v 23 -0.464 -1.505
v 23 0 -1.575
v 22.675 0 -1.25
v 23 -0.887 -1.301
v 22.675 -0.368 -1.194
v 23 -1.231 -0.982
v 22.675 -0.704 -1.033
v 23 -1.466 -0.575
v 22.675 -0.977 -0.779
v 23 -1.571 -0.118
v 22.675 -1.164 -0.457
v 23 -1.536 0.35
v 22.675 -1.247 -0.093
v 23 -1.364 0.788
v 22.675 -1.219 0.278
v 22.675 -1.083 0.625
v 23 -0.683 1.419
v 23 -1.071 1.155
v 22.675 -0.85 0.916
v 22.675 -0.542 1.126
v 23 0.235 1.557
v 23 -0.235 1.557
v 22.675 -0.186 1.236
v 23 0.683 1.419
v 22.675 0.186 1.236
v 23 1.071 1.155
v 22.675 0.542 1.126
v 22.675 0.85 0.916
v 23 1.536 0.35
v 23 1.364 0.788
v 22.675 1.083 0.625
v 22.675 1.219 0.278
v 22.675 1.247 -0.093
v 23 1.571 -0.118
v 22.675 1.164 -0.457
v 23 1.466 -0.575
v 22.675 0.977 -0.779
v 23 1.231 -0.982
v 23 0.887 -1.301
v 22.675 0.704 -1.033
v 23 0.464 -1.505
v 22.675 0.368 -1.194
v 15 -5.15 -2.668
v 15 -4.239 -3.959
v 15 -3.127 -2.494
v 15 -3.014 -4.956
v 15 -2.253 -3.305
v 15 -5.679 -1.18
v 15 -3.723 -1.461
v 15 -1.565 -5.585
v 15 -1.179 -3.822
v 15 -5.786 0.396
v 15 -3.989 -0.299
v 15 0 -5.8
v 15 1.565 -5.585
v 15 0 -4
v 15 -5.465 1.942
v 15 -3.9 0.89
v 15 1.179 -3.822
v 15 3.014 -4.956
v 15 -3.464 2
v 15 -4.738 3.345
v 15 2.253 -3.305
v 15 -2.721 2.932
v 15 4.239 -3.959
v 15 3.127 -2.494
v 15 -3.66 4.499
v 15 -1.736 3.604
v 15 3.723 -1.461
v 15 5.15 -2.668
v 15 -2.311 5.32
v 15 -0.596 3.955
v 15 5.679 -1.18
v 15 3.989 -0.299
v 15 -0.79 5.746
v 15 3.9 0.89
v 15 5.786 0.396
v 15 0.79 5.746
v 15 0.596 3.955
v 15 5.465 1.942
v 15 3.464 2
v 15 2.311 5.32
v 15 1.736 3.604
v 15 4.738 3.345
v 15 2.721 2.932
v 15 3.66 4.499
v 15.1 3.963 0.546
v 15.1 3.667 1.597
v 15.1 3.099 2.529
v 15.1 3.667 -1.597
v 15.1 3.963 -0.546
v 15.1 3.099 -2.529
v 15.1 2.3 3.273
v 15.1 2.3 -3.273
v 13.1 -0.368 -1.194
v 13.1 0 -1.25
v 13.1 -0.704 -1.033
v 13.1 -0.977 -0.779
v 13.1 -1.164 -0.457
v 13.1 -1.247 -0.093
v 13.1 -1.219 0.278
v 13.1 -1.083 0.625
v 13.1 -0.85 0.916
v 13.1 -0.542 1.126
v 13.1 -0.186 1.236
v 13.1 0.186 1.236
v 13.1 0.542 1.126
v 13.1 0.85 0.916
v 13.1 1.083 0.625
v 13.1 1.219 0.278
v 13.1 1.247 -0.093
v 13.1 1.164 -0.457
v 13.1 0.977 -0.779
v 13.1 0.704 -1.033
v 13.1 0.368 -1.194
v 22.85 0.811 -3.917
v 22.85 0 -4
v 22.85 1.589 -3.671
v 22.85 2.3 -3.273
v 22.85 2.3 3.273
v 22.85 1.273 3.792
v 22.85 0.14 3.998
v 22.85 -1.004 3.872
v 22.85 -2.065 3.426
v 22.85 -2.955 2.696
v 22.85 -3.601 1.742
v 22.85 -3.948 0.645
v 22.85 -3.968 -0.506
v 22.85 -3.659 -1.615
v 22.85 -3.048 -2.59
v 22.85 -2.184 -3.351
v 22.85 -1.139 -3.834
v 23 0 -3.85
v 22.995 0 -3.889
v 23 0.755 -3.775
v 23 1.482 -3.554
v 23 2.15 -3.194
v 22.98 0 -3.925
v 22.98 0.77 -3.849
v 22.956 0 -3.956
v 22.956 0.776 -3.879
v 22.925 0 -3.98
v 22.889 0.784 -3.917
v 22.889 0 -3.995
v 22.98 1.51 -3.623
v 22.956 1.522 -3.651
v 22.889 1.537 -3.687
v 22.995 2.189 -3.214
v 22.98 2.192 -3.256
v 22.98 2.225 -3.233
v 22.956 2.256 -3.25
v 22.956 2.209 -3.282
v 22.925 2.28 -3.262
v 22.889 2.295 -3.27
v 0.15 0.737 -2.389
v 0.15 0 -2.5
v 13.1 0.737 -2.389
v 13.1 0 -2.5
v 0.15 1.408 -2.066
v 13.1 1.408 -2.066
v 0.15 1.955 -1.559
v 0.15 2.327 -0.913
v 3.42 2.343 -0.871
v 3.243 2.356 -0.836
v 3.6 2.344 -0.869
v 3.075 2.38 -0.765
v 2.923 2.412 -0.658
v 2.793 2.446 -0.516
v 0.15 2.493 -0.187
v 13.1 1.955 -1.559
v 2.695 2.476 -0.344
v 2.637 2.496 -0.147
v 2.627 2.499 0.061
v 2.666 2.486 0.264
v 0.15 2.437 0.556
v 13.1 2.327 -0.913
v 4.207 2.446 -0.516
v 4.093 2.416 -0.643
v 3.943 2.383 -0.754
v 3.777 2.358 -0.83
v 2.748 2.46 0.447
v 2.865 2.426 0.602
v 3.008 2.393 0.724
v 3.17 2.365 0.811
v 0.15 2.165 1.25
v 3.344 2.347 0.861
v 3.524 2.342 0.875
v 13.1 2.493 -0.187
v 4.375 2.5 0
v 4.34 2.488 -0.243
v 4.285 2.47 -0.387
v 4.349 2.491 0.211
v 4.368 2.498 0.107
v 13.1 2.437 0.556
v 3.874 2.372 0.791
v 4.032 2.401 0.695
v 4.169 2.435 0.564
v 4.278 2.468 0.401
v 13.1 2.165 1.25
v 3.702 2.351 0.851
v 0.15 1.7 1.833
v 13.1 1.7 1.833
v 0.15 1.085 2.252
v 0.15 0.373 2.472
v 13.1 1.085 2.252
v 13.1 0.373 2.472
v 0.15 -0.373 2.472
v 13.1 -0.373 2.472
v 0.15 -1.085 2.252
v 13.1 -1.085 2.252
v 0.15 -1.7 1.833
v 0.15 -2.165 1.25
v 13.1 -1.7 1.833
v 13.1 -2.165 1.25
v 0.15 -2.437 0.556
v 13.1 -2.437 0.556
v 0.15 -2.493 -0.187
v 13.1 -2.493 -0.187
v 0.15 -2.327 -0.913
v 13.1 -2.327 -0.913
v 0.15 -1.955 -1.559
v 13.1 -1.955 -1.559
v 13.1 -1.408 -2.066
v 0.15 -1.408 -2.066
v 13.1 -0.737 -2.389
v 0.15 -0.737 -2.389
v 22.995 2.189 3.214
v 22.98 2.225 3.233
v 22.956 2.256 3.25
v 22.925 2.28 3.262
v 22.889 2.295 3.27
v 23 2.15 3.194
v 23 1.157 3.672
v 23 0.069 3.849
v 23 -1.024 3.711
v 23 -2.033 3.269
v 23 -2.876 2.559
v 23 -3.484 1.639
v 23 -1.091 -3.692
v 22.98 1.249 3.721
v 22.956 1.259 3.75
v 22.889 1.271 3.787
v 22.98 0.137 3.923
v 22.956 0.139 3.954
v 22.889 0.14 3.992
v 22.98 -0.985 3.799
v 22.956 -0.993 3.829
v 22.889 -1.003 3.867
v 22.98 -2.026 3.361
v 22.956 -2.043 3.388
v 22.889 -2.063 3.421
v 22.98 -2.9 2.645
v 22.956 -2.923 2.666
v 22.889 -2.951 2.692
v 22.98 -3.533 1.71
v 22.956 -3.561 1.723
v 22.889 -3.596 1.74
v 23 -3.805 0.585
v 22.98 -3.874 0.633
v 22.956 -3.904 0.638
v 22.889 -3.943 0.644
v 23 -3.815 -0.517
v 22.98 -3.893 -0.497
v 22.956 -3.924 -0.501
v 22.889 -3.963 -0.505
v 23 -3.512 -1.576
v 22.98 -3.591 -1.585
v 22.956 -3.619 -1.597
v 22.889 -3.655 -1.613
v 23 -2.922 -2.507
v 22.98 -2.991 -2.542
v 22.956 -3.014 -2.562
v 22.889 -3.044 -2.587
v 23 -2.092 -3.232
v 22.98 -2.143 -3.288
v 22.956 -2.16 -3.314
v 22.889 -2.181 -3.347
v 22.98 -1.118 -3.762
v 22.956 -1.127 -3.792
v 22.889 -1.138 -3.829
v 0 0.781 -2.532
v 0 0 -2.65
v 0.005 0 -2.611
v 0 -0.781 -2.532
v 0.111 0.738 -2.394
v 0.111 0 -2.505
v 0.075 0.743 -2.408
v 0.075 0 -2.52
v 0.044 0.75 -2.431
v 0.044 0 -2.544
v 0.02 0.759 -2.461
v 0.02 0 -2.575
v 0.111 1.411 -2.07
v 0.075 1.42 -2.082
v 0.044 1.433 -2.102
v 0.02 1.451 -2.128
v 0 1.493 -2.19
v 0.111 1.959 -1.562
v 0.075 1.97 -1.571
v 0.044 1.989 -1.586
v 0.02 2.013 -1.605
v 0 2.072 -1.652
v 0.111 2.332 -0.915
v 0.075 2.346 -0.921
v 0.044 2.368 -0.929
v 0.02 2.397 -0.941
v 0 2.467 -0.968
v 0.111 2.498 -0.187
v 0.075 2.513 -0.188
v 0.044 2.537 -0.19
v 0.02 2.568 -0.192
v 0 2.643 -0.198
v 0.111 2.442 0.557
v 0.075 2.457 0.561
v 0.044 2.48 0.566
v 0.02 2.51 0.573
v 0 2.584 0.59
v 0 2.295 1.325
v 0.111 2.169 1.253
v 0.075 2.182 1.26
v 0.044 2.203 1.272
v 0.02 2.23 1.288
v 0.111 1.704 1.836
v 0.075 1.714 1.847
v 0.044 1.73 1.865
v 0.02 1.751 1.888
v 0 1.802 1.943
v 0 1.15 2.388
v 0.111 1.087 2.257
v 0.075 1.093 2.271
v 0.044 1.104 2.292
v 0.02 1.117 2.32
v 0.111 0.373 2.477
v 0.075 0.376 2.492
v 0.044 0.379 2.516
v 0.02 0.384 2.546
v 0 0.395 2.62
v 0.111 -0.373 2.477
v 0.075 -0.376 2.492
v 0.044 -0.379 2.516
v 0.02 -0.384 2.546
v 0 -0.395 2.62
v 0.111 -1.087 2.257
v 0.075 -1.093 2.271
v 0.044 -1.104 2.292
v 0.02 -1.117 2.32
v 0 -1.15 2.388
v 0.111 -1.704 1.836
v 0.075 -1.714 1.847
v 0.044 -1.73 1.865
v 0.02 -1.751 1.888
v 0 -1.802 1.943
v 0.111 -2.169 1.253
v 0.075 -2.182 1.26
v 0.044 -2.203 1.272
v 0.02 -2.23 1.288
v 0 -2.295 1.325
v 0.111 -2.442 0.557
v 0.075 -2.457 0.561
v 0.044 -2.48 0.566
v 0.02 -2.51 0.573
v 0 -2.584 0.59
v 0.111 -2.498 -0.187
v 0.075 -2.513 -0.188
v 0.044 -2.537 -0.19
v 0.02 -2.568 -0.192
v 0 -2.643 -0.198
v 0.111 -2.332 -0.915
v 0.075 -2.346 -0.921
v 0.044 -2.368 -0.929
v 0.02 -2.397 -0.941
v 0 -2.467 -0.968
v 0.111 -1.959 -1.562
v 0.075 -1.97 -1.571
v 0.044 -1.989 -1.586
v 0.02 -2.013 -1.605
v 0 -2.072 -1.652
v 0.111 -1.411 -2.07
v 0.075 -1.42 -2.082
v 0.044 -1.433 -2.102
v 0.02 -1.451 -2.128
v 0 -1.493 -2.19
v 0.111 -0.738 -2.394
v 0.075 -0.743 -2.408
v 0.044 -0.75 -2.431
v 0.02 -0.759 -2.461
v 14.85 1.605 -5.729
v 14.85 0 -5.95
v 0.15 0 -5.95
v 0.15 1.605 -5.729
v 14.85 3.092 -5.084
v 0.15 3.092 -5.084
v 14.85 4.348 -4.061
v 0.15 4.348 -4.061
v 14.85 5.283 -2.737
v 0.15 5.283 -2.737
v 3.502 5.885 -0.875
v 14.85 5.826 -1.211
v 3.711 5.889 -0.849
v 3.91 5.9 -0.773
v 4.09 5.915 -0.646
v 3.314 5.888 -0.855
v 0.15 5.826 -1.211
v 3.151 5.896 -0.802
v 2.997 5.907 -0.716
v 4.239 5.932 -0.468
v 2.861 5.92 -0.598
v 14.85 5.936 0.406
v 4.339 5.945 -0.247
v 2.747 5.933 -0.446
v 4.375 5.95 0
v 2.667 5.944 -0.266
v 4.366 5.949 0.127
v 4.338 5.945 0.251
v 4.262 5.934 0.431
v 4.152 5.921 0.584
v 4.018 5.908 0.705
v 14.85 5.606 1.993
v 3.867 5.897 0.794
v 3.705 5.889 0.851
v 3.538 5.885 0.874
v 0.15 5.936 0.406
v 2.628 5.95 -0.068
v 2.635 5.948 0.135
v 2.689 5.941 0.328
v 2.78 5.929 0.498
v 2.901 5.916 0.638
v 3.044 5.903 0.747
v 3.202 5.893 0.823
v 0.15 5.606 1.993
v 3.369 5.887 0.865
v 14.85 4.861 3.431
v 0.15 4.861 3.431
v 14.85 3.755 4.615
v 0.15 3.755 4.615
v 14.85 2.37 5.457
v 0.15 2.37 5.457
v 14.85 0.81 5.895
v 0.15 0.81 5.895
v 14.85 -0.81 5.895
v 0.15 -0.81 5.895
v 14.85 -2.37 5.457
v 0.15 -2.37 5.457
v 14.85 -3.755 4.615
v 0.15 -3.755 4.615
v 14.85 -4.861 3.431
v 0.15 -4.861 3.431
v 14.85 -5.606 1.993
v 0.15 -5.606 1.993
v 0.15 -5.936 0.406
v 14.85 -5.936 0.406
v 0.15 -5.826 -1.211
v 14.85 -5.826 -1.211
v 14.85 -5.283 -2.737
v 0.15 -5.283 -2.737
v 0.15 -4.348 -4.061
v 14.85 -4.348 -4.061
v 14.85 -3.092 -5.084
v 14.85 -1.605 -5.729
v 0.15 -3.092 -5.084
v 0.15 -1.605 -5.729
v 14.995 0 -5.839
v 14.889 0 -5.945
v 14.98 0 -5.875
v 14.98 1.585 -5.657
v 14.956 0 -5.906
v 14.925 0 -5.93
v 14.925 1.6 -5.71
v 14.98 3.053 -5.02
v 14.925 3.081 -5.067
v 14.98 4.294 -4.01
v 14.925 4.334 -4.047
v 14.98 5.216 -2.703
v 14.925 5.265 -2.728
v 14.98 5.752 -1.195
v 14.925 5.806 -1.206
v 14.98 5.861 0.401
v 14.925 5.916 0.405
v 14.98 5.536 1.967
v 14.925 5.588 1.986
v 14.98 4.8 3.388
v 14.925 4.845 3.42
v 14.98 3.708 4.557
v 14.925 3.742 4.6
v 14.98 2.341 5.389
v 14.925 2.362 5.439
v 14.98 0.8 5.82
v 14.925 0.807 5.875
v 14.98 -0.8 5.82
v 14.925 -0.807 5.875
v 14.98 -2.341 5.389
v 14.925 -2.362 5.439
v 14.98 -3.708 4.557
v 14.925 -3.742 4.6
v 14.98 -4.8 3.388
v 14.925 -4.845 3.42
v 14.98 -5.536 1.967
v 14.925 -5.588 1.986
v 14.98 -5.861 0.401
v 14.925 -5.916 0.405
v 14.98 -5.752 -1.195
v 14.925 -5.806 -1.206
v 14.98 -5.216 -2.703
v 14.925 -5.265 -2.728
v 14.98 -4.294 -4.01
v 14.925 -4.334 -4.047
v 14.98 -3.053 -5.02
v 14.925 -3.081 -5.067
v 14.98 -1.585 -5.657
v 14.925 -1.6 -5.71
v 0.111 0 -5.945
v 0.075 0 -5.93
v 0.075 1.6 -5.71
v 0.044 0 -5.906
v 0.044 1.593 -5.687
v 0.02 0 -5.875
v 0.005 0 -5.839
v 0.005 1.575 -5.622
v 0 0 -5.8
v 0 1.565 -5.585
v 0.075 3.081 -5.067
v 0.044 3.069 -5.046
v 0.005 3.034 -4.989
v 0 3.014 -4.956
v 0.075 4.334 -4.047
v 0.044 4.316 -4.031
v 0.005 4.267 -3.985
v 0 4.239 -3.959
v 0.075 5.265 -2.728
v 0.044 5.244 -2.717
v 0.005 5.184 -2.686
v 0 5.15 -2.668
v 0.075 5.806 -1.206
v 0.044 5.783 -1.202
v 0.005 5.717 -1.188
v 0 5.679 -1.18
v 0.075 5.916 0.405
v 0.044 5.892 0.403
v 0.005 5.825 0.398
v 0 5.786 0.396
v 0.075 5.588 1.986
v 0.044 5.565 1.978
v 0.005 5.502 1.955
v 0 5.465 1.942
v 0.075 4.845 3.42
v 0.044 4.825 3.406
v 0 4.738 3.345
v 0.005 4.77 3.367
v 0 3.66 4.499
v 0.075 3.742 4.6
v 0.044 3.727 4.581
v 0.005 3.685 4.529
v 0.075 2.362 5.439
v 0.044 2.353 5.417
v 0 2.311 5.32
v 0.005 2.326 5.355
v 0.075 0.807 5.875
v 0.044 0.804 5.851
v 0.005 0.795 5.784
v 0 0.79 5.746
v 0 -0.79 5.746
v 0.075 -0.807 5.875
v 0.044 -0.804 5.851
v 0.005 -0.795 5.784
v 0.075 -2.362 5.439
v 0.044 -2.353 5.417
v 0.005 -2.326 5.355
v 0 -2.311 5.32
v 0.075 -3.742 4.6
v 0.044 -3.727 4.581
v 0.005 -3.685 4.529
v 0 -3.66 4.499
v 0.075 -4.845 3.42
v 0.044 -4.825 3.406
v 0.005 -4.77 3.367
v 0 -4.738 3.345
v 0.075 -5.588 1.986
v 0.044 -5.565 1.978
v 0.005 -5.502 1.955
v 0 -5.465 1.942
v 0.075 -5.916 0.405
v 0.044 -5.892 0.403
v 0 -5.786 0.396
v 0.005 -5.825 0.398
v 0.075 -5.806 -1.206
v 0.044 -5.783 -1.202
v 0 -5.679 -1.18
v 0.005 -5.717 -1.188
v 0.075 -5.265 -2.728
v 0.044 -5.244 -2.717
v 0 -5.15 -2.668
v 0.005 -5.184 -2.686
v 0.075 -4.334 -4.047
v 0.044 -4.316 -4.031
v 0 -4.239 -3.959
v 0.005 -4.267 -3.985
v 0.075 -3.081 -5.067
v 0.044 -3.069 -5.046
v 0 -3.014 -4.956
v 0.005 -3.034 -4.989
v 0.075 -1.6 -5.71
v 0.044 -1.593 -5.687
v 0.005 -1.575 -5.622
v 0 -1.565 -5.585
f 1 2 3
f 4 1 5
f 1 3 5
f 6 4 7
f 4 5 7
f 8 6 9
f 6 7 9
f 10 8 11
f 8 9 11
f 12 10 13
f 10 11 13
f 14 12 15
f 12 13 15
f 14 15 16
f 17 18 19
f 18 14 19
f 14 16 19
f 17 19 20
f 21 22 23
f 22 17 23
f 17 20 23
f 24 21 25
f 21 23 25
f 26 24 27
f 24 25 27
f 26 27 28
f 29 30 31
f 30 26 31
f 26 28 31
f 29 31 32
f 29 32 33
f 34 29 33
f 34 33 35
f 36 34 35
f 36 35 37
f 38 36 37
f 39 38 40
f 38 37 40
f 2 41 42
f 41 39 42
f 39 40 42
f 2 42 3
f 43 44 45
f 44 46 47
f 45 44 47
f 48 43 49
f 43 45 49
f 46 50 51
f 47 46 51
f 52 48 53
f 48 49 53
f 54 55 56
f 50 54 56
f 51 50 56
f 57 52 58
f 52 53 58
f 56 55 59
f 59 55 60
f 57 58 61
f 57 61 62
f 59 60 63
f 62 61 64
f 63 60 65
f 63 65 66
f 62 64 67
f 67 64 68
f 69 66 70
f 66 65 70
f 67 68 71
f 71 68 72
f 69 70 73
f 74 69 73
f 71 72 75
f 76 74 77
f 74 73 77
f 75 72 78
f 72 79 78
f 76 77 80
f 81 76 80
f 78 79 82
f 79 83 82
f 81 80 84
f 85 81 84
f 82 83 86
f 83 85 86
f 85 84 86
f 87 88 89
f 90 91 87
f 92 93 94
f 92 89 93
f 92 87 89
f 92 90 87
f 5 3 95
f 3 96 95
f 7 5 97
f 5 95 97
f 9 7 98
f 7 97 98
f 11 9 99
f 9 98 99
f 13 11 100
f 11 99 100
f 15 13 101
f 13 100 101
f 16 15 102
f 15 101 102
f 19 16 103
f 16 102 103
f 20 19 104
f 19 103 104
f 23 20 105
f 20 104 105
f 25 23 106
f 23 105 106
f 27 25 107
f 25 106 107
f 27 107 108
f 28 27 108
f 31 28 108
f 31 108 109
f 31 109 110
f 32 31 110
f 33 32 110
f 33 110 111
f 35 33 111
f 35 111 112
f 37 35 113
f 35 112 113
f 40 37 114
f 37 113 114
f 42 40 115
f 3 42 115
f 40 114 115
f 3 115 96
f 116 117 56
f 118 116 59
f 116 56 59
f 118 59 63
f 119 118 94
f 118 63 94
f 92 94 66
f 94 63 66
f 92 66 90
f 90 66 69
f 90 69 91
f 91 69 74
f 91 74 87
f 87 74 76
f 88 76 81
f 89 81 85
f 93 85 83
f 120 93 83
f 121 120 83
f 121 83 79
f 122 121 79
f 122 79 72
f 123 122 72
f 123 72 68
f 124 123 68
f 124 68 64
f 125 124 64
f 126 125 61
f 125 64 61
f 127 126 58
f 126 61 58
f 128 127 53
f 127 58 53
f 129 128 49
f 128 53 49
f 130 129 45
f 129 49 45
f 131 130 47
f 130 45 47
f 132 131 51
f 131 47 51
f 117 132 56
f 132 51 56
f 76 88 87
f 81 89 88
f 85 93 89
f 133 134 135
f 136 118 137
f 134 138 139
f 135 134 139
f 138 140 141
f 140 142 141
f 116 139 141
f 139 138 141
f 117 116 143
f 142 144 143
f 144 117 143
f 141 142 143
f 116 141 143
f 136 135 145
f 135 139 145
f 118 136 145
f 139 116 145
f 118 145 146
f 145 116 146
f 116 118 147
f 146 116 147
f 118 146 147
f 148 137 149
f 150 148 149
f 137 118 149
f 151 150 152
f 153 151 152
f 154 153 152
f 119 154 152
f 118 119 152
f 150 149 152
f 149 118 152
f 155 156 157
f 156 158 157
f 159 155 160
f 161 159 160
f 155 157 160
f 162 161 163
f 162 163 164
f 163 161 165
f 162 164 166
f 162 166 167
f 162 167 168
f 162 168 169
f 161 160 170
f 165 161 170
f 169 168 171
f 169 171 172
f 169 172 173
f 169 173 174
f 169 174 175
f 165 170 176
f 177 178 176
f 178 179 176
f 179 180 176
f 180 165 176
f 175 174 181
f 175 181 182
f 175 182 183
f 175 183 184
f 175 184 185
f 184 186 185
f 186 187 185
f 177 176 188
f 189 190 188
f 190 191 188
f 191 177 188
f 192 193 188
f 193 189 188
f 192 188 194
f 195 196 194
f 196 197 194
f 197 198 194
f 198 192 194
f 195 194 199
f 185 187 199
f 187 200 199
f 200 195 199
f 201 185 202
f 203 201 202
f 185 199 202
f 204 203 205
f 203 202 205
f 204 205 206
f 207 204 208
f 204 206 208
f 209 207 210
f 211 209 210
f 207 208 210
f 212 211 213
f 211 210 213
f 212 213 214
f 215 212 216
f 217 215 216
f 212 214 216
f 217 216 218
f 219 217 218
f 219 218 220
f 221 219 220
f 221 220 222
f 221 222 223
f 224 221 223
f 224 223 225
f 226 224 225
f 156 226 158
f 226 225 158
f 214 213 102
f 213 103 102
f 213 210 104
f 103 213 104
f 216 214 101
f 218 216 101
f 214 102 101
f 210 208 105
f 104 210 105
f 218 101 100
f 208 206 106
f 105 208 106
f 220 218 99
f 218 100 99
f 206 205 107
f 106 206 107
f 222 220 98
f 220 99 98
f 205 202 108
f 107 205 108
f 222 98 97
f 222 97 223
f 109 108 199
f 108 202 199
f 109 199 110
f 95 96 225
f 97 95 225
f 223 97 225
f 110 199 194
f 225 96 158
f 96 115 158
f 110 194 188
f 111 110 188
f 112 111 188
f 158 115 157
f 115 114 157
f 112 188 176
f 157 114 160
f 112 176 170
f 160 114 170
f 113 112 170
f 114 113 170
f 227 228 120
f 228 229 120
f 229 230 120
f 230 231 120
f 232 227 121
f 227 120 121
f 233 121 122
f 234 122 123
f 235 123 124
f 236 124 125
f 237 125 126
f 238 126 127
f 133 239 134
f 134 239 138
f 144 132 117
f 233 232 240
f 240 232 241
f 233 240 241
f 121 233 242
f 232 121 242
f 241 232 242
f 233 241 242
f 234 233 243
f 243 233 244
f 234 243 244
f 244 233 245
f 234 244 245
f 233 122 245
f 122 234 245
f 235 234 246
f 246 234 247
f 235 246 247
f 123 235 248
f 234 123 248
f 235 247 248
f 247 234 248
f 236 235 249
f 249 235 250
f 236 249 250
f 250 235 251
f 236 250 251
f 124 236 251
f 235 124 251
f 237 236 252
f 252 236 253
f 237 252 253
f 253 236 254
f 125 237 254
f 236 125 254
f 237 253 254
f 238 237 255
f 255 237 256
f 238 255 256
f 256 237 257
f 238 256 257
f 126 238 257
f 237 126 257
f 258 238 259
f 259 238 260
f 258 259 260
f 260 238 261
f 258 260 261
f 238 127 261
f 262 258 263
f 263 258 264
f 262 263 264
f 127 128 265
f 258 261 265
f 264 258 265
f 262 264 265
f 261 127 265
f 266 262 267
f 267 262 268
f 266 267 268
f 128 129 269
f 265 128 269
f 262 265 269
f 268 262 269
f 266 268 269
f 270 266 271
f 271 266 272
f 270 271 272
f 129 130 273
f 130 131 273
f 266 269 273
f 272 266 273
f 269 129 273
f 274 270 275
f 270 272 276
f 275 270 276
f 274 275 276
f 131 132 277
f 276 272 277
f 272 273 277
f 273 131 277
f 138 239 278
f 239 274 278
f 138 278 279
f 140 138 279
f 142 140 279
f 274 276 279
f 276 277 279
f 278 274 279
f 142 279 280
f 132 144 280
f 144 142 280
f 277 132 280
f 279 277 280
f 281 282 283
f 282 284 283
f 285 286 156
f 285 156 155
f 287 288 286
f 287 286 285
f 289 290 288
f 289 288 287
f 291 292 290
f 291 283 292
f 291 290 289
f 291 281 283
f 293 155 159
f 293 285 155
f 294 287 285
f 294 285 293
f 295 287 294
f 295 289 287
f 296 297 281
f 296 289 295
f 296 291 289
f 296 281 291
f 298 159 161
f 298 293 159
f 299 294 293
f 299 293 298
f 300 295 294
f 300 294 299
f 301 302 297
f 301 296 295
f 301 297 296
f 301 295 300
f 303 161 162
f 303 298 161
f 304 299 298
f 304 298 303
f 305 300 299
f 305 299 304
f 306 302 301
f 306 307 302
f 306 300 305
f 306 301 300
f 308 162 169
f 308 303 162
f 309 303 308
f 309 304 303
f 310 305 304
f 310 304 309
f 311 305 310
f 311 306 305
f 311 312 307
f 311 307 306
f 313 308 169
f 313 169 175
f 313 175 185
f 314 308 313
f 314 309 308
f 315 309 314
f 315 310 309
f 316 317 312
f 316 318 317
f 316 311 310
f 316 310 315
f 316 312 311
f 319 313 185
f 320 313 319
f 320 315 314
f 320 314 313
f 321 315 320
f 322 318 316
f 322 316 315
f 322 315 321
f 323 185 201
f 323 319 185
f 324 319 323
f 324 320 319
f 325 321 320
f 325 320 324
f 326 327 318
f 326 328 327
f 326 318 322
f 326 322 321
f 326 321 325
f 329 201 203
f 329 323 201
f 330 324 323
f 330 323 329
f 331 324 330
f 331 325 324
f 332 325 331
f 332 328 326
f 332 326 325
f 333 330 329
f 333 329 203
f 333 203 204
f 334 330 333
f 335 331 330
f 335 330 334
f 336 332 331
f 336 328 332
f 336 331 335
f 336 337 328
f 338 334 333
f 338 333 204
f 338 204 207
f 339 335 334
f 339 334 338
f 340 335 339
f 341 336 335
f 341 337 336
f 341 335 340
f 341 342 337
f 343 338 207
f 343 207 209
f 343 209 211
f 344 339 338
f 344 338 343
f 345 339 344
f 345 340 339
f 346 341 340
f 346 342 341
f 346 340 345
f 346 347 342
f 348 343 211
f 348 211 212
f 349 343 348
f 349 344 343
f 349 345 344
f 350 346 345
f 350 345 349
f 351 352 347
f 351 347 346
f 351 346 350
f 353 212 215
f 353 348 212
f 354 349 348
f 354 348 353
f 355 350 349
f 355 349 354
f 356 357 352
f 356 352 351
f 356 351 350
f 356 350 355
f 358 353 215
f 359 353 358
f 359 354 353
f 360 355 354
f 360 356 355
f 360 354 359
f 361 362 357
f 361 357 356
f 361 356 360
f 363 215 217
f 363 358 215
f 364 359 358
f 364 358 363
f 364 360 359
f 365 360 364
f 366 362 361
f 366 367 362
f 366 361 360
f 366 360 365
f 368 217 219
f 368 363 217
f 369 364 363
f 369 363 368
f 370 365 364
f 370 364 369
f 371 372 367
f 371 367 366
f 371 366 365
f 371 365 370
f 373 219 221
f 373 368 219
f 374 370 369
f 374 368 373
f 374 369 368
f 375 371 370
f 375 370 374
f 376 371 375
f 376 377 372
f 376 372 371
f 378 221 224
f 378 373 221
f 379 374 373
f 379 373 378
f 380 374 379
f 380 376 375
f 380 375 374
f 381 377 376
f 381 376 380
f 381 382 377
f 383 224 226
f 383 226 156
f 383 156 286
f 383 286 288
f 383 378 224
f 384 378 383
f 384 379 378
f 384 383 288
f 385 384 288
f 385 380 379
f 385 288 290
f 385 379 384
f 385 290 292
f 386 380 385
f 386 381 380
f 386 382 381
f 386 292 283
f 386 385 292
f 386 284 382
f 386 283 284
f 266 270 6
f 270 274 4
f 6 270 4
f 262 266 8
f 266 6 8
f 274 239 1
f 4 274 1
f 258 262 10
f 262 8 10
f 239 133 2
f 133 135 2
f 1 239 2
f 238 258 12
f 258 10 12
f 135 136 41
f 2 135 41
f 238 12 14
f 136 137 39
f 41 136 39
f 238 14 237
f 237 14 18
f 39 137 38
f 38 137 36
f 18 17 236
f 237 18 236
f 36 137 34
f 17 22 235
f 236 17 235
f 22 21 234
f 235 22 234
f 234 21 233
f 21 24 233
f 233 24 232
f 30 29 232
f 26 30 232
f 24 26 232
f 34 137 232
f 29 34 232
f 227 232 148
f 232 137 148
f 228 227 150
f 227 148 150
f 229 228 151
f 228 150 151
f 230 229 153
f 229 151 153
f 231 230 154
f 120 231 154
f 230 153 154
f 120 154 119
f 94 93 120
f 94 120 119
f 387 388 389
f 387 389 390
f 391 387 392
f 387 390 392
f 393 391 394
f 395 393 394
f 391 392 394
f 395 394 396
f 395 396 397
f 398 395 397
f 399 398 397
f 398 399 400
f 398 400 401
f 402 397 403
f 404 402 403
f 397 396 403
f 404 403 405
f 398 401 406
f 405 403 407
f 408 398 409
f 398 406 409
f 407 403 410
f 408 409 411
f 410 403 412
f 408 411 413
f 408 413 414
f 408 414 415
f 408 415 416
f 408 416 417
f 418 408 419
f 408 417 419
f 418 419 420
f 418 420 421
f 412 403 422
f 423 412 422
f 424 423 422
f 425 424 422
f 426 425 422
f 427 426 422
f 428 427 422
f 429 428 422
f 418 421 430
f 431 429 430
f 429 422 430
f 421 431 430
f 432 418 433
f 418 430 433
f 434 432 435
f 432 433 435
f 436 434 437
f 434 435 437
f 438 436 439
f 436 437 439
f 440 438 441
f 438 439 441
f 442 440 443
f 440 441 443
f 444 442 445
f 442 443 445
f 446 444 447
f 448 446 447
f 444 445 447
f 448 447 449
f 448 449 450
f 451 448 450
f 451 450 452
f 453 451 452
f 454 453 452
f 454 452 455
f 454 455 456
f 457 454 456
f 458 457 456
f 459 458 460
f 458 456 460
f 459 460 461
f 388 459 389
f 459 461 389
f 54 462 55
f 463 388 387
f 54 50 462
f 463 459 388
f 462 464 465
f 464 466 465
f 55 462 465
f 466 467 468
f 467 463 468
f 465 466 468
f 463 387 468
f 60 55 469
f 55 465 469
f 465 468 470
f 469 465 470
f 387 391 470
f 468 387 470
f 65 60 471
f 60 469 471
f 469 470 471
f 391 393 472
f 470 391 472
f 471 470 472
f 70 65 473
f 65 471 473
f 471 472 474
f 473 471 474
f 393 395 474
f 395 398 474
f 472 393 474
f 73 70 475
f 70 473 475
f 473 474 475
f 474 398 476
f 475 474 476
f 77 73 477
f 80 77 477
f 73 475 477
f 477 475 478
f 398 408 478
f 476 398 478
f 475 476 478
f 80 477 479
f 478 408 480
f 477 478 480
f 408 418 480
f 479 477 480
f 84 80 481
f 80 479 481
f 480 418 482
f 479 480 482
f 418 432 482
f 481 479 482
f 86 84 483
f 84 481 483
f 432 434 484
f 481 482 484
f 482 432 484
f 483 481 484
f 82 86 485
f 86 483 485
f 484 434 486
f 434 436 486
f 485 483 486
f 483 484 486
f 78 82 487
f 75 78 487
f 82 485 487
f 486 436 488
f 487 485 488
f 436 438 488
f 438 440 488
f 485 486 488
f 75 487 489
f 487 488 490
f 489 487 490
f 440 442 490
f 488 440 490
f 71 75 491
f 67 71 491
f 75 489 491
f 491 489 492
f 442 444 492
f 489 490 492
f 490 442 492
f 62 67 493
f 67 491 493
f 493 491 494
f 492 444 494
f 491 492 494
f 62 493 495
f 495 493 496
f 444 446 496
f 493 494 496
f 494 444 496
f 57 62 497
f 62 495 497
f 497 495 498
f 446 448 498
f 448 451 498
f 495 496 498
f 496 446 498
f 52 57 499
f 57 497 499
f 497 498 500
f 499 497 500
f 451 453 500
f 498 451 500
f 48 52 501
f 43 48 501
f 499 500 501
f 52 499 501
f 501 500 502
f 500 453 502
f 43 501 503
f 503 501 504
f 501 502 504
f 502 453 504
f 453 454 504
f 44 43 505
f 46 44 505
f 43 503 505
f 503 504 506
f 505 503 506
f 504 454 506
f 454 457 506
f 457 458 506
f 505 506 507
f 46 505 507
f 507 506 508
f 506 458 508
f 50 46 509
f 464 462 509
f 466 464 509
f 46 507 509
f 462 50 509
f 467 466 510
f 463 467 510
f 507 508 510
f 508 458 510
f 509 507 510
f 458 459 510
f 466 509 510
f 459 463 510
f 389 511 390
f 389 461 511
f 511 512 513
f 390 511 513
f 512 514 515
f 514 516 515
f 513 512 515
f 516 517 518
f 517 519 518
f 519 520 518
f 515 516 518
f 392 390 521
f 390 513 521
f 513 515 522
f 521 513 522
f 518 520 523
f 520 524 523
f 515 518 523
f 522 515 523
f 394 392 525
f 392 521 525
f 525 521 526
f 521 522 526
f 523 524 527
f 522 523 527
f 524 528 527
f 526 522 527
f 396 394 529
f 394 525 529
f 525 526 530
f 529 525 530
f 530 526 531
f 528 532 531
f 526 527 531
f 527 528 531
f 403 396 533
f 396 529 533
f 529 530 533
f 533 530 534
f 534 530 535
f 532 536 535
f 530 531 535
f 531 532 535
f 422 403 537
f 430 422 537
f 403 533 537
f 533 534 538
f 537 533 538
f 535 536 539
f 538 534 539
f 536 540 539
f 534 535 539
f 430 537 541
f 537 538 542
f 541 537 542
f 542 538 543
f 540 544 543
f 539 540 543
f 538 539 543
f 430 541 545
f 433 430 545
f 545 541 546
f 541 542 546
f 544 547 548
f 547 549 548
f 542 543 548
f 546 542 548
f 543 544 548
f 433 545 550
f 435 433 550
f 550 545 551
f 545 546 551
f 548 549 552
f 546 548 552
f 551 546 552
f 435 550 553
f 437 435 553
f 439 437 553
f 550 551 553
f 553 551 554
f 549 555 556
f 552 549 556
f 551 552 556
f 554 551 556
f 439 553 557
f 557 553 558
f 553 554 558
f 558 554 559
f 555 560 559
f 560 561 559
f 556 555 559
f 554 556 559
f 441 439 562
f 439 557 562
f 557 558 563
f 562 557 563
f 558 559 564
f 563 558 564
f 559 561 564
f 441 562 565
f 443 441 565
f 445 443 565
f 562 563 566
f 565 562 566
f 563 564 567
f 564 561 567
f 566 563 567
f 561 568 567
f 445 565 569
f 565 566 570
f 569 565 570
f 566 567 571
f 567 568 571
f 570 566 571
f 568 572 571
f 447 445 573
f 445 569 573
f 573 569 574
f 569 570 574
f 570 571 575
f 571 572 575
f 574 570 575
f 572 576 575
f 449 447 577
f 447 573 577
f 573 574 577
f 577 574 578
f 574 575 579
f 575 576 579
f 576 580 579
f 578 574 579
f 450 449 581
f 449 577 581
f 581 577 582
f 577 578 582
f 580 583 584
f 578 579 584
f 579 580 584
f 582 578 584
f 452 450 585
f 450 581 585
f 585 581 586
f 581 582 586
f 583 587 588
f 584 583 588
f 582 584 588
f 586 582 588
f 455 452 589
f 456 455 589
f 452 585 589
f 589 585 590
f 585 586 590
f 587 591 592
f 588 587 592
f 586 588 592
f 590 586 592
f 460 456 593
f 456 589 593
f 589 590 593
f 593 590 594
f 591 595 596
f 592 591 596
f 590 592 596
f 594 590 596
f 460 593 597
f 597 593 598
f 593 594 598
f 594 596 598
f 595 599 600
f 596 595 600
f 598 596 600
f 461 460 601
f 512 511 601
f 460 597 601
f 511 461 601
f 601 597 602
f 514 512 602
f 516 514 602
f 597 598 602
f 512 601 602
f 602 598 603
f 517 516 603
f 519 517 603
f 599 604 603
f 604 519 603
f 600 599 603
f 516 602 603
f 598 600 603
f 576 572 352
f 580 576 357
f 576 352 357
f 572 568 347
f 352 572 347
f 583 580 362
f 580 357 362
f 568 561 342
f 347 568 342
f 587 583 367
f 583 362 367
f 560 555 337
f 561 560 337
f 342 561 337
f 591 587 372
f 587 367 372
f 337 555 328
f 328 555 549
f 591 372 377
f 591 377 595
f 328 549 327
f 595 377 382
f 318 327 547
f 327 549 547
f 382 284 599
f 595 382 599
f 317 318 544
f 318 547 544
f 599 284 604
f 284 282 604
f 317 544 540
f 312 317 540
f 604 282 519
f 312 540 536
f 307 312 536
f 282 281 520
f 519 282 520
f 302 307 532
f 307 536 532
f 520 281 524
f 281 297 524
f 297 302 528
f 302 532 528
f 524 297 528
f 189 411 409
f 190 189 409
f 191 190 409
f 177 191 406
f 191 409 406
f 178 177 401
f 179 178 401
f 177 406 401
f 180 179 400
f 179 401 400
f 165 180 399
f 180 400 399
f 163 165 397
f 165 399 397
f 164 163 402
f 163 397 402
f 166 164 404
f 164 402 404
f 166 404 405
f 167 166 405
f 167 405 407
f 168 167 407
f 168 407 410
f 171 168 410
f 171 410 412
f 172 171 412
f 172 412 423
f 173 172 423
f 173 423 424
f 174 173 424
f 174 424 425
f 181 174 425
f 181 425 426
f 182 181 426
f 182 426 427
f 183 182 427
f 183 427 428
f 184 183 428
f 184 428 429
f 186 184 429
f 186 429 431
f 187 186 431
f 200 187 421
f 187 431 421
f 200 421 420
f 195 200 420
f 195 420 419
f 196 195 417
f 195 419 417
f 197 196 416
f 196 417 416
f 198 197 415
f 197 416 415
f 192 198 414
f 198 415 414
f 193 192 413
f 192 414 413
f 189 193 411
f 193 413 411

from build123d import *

# Parameters (mm, degrees)
CUT_EXTRUDE1_DEPTH          = 7.9
M3_TAPPED_HOLE1_D           = 2.5
M3_TAPPED_HOLE1_CSINK_D     = 3.15
M3_TAPPED_HOLE1_CSINK_ANGLE = 90
FILLET1_R                   = 0.15
SKETCH6_R                   = 0.875
CUT_EXTRUDE2_DEPTH          = 6


with BuildPart() as part:
    # Sketch2 → Revolve1 (revolve)
    with BuildSketch(Plane(origin=(0, 0, 0), x_dir=(1, 0, 0), z_dir=(0, 1, 0))):
        Polygon((0, 2.5), (13.1, 2.5), (13.1, 0), (23, 0), (23, 4), (15, 4), (15, 5.95), (0, 5.95), align=None)
    revolve(axis=Axis((0, 0, 0), (1, 0, 0)))

    # Sketch3 → Cut-Extrude1 (cut)
    with BuildSketch(Plane(origin=(23, 0, 0), x_dir=(0, 0, -1), z_dir=(1, 0, 0))):
        with BuildLine():
            Line((-3.272613634, 2.3), (3.272613634, 2.3))
            ThreePointArc((3.272613634, 2.3), (0, 4), (-3.272613634, 2.3))
        make_face()
    extrude(amount=-CUT_EXTRUDE1_DEPTH, mode=Mode.SUBTRACT)

    # M3 Tapped Hole1 (through all)
    with Locations(Plane(origin=(23, 0, 0), x_dir=(0, 0, 1), z_dir=(1, 0, 0))):
        with Locations((0, 0)):
            CounterSinkHole(M3_TAPPED_HOLE1_D / 2, M3_TAPPED_HOLE1_CSINK_D / 2, counter_sink_angle=M3_TAPPED_HOLE1_CSINK_ANGLE)

    # Fillet1
    fillet1_edges = [part.edges().sort_by_distance(p)[0] for p in [
        (23, -3.813820561, 1.206139599),
        (23, 2.3, 0),
        (0, 0, 2.5),
        (0, 0, 5.95),
        (15, 0, 5.95),
    ]]
    fillet(fillet1_edges, radius=FILLET1_R)

    # Sketch6 → Cut-Extrude2 (cut)
    with BuildSketch(Plane(origin=(0, 5.95, 0), x_dir=(1, 0, 0), z_dir=(0, 1, 0))):
        with Locations((3.5, 0)):
            Circle(SKETCH6_R)
    extrude(amount=-CUT_EXTRUDE2_DEPTH, mode=Mode.SUBTRACT)


solid = part.part
